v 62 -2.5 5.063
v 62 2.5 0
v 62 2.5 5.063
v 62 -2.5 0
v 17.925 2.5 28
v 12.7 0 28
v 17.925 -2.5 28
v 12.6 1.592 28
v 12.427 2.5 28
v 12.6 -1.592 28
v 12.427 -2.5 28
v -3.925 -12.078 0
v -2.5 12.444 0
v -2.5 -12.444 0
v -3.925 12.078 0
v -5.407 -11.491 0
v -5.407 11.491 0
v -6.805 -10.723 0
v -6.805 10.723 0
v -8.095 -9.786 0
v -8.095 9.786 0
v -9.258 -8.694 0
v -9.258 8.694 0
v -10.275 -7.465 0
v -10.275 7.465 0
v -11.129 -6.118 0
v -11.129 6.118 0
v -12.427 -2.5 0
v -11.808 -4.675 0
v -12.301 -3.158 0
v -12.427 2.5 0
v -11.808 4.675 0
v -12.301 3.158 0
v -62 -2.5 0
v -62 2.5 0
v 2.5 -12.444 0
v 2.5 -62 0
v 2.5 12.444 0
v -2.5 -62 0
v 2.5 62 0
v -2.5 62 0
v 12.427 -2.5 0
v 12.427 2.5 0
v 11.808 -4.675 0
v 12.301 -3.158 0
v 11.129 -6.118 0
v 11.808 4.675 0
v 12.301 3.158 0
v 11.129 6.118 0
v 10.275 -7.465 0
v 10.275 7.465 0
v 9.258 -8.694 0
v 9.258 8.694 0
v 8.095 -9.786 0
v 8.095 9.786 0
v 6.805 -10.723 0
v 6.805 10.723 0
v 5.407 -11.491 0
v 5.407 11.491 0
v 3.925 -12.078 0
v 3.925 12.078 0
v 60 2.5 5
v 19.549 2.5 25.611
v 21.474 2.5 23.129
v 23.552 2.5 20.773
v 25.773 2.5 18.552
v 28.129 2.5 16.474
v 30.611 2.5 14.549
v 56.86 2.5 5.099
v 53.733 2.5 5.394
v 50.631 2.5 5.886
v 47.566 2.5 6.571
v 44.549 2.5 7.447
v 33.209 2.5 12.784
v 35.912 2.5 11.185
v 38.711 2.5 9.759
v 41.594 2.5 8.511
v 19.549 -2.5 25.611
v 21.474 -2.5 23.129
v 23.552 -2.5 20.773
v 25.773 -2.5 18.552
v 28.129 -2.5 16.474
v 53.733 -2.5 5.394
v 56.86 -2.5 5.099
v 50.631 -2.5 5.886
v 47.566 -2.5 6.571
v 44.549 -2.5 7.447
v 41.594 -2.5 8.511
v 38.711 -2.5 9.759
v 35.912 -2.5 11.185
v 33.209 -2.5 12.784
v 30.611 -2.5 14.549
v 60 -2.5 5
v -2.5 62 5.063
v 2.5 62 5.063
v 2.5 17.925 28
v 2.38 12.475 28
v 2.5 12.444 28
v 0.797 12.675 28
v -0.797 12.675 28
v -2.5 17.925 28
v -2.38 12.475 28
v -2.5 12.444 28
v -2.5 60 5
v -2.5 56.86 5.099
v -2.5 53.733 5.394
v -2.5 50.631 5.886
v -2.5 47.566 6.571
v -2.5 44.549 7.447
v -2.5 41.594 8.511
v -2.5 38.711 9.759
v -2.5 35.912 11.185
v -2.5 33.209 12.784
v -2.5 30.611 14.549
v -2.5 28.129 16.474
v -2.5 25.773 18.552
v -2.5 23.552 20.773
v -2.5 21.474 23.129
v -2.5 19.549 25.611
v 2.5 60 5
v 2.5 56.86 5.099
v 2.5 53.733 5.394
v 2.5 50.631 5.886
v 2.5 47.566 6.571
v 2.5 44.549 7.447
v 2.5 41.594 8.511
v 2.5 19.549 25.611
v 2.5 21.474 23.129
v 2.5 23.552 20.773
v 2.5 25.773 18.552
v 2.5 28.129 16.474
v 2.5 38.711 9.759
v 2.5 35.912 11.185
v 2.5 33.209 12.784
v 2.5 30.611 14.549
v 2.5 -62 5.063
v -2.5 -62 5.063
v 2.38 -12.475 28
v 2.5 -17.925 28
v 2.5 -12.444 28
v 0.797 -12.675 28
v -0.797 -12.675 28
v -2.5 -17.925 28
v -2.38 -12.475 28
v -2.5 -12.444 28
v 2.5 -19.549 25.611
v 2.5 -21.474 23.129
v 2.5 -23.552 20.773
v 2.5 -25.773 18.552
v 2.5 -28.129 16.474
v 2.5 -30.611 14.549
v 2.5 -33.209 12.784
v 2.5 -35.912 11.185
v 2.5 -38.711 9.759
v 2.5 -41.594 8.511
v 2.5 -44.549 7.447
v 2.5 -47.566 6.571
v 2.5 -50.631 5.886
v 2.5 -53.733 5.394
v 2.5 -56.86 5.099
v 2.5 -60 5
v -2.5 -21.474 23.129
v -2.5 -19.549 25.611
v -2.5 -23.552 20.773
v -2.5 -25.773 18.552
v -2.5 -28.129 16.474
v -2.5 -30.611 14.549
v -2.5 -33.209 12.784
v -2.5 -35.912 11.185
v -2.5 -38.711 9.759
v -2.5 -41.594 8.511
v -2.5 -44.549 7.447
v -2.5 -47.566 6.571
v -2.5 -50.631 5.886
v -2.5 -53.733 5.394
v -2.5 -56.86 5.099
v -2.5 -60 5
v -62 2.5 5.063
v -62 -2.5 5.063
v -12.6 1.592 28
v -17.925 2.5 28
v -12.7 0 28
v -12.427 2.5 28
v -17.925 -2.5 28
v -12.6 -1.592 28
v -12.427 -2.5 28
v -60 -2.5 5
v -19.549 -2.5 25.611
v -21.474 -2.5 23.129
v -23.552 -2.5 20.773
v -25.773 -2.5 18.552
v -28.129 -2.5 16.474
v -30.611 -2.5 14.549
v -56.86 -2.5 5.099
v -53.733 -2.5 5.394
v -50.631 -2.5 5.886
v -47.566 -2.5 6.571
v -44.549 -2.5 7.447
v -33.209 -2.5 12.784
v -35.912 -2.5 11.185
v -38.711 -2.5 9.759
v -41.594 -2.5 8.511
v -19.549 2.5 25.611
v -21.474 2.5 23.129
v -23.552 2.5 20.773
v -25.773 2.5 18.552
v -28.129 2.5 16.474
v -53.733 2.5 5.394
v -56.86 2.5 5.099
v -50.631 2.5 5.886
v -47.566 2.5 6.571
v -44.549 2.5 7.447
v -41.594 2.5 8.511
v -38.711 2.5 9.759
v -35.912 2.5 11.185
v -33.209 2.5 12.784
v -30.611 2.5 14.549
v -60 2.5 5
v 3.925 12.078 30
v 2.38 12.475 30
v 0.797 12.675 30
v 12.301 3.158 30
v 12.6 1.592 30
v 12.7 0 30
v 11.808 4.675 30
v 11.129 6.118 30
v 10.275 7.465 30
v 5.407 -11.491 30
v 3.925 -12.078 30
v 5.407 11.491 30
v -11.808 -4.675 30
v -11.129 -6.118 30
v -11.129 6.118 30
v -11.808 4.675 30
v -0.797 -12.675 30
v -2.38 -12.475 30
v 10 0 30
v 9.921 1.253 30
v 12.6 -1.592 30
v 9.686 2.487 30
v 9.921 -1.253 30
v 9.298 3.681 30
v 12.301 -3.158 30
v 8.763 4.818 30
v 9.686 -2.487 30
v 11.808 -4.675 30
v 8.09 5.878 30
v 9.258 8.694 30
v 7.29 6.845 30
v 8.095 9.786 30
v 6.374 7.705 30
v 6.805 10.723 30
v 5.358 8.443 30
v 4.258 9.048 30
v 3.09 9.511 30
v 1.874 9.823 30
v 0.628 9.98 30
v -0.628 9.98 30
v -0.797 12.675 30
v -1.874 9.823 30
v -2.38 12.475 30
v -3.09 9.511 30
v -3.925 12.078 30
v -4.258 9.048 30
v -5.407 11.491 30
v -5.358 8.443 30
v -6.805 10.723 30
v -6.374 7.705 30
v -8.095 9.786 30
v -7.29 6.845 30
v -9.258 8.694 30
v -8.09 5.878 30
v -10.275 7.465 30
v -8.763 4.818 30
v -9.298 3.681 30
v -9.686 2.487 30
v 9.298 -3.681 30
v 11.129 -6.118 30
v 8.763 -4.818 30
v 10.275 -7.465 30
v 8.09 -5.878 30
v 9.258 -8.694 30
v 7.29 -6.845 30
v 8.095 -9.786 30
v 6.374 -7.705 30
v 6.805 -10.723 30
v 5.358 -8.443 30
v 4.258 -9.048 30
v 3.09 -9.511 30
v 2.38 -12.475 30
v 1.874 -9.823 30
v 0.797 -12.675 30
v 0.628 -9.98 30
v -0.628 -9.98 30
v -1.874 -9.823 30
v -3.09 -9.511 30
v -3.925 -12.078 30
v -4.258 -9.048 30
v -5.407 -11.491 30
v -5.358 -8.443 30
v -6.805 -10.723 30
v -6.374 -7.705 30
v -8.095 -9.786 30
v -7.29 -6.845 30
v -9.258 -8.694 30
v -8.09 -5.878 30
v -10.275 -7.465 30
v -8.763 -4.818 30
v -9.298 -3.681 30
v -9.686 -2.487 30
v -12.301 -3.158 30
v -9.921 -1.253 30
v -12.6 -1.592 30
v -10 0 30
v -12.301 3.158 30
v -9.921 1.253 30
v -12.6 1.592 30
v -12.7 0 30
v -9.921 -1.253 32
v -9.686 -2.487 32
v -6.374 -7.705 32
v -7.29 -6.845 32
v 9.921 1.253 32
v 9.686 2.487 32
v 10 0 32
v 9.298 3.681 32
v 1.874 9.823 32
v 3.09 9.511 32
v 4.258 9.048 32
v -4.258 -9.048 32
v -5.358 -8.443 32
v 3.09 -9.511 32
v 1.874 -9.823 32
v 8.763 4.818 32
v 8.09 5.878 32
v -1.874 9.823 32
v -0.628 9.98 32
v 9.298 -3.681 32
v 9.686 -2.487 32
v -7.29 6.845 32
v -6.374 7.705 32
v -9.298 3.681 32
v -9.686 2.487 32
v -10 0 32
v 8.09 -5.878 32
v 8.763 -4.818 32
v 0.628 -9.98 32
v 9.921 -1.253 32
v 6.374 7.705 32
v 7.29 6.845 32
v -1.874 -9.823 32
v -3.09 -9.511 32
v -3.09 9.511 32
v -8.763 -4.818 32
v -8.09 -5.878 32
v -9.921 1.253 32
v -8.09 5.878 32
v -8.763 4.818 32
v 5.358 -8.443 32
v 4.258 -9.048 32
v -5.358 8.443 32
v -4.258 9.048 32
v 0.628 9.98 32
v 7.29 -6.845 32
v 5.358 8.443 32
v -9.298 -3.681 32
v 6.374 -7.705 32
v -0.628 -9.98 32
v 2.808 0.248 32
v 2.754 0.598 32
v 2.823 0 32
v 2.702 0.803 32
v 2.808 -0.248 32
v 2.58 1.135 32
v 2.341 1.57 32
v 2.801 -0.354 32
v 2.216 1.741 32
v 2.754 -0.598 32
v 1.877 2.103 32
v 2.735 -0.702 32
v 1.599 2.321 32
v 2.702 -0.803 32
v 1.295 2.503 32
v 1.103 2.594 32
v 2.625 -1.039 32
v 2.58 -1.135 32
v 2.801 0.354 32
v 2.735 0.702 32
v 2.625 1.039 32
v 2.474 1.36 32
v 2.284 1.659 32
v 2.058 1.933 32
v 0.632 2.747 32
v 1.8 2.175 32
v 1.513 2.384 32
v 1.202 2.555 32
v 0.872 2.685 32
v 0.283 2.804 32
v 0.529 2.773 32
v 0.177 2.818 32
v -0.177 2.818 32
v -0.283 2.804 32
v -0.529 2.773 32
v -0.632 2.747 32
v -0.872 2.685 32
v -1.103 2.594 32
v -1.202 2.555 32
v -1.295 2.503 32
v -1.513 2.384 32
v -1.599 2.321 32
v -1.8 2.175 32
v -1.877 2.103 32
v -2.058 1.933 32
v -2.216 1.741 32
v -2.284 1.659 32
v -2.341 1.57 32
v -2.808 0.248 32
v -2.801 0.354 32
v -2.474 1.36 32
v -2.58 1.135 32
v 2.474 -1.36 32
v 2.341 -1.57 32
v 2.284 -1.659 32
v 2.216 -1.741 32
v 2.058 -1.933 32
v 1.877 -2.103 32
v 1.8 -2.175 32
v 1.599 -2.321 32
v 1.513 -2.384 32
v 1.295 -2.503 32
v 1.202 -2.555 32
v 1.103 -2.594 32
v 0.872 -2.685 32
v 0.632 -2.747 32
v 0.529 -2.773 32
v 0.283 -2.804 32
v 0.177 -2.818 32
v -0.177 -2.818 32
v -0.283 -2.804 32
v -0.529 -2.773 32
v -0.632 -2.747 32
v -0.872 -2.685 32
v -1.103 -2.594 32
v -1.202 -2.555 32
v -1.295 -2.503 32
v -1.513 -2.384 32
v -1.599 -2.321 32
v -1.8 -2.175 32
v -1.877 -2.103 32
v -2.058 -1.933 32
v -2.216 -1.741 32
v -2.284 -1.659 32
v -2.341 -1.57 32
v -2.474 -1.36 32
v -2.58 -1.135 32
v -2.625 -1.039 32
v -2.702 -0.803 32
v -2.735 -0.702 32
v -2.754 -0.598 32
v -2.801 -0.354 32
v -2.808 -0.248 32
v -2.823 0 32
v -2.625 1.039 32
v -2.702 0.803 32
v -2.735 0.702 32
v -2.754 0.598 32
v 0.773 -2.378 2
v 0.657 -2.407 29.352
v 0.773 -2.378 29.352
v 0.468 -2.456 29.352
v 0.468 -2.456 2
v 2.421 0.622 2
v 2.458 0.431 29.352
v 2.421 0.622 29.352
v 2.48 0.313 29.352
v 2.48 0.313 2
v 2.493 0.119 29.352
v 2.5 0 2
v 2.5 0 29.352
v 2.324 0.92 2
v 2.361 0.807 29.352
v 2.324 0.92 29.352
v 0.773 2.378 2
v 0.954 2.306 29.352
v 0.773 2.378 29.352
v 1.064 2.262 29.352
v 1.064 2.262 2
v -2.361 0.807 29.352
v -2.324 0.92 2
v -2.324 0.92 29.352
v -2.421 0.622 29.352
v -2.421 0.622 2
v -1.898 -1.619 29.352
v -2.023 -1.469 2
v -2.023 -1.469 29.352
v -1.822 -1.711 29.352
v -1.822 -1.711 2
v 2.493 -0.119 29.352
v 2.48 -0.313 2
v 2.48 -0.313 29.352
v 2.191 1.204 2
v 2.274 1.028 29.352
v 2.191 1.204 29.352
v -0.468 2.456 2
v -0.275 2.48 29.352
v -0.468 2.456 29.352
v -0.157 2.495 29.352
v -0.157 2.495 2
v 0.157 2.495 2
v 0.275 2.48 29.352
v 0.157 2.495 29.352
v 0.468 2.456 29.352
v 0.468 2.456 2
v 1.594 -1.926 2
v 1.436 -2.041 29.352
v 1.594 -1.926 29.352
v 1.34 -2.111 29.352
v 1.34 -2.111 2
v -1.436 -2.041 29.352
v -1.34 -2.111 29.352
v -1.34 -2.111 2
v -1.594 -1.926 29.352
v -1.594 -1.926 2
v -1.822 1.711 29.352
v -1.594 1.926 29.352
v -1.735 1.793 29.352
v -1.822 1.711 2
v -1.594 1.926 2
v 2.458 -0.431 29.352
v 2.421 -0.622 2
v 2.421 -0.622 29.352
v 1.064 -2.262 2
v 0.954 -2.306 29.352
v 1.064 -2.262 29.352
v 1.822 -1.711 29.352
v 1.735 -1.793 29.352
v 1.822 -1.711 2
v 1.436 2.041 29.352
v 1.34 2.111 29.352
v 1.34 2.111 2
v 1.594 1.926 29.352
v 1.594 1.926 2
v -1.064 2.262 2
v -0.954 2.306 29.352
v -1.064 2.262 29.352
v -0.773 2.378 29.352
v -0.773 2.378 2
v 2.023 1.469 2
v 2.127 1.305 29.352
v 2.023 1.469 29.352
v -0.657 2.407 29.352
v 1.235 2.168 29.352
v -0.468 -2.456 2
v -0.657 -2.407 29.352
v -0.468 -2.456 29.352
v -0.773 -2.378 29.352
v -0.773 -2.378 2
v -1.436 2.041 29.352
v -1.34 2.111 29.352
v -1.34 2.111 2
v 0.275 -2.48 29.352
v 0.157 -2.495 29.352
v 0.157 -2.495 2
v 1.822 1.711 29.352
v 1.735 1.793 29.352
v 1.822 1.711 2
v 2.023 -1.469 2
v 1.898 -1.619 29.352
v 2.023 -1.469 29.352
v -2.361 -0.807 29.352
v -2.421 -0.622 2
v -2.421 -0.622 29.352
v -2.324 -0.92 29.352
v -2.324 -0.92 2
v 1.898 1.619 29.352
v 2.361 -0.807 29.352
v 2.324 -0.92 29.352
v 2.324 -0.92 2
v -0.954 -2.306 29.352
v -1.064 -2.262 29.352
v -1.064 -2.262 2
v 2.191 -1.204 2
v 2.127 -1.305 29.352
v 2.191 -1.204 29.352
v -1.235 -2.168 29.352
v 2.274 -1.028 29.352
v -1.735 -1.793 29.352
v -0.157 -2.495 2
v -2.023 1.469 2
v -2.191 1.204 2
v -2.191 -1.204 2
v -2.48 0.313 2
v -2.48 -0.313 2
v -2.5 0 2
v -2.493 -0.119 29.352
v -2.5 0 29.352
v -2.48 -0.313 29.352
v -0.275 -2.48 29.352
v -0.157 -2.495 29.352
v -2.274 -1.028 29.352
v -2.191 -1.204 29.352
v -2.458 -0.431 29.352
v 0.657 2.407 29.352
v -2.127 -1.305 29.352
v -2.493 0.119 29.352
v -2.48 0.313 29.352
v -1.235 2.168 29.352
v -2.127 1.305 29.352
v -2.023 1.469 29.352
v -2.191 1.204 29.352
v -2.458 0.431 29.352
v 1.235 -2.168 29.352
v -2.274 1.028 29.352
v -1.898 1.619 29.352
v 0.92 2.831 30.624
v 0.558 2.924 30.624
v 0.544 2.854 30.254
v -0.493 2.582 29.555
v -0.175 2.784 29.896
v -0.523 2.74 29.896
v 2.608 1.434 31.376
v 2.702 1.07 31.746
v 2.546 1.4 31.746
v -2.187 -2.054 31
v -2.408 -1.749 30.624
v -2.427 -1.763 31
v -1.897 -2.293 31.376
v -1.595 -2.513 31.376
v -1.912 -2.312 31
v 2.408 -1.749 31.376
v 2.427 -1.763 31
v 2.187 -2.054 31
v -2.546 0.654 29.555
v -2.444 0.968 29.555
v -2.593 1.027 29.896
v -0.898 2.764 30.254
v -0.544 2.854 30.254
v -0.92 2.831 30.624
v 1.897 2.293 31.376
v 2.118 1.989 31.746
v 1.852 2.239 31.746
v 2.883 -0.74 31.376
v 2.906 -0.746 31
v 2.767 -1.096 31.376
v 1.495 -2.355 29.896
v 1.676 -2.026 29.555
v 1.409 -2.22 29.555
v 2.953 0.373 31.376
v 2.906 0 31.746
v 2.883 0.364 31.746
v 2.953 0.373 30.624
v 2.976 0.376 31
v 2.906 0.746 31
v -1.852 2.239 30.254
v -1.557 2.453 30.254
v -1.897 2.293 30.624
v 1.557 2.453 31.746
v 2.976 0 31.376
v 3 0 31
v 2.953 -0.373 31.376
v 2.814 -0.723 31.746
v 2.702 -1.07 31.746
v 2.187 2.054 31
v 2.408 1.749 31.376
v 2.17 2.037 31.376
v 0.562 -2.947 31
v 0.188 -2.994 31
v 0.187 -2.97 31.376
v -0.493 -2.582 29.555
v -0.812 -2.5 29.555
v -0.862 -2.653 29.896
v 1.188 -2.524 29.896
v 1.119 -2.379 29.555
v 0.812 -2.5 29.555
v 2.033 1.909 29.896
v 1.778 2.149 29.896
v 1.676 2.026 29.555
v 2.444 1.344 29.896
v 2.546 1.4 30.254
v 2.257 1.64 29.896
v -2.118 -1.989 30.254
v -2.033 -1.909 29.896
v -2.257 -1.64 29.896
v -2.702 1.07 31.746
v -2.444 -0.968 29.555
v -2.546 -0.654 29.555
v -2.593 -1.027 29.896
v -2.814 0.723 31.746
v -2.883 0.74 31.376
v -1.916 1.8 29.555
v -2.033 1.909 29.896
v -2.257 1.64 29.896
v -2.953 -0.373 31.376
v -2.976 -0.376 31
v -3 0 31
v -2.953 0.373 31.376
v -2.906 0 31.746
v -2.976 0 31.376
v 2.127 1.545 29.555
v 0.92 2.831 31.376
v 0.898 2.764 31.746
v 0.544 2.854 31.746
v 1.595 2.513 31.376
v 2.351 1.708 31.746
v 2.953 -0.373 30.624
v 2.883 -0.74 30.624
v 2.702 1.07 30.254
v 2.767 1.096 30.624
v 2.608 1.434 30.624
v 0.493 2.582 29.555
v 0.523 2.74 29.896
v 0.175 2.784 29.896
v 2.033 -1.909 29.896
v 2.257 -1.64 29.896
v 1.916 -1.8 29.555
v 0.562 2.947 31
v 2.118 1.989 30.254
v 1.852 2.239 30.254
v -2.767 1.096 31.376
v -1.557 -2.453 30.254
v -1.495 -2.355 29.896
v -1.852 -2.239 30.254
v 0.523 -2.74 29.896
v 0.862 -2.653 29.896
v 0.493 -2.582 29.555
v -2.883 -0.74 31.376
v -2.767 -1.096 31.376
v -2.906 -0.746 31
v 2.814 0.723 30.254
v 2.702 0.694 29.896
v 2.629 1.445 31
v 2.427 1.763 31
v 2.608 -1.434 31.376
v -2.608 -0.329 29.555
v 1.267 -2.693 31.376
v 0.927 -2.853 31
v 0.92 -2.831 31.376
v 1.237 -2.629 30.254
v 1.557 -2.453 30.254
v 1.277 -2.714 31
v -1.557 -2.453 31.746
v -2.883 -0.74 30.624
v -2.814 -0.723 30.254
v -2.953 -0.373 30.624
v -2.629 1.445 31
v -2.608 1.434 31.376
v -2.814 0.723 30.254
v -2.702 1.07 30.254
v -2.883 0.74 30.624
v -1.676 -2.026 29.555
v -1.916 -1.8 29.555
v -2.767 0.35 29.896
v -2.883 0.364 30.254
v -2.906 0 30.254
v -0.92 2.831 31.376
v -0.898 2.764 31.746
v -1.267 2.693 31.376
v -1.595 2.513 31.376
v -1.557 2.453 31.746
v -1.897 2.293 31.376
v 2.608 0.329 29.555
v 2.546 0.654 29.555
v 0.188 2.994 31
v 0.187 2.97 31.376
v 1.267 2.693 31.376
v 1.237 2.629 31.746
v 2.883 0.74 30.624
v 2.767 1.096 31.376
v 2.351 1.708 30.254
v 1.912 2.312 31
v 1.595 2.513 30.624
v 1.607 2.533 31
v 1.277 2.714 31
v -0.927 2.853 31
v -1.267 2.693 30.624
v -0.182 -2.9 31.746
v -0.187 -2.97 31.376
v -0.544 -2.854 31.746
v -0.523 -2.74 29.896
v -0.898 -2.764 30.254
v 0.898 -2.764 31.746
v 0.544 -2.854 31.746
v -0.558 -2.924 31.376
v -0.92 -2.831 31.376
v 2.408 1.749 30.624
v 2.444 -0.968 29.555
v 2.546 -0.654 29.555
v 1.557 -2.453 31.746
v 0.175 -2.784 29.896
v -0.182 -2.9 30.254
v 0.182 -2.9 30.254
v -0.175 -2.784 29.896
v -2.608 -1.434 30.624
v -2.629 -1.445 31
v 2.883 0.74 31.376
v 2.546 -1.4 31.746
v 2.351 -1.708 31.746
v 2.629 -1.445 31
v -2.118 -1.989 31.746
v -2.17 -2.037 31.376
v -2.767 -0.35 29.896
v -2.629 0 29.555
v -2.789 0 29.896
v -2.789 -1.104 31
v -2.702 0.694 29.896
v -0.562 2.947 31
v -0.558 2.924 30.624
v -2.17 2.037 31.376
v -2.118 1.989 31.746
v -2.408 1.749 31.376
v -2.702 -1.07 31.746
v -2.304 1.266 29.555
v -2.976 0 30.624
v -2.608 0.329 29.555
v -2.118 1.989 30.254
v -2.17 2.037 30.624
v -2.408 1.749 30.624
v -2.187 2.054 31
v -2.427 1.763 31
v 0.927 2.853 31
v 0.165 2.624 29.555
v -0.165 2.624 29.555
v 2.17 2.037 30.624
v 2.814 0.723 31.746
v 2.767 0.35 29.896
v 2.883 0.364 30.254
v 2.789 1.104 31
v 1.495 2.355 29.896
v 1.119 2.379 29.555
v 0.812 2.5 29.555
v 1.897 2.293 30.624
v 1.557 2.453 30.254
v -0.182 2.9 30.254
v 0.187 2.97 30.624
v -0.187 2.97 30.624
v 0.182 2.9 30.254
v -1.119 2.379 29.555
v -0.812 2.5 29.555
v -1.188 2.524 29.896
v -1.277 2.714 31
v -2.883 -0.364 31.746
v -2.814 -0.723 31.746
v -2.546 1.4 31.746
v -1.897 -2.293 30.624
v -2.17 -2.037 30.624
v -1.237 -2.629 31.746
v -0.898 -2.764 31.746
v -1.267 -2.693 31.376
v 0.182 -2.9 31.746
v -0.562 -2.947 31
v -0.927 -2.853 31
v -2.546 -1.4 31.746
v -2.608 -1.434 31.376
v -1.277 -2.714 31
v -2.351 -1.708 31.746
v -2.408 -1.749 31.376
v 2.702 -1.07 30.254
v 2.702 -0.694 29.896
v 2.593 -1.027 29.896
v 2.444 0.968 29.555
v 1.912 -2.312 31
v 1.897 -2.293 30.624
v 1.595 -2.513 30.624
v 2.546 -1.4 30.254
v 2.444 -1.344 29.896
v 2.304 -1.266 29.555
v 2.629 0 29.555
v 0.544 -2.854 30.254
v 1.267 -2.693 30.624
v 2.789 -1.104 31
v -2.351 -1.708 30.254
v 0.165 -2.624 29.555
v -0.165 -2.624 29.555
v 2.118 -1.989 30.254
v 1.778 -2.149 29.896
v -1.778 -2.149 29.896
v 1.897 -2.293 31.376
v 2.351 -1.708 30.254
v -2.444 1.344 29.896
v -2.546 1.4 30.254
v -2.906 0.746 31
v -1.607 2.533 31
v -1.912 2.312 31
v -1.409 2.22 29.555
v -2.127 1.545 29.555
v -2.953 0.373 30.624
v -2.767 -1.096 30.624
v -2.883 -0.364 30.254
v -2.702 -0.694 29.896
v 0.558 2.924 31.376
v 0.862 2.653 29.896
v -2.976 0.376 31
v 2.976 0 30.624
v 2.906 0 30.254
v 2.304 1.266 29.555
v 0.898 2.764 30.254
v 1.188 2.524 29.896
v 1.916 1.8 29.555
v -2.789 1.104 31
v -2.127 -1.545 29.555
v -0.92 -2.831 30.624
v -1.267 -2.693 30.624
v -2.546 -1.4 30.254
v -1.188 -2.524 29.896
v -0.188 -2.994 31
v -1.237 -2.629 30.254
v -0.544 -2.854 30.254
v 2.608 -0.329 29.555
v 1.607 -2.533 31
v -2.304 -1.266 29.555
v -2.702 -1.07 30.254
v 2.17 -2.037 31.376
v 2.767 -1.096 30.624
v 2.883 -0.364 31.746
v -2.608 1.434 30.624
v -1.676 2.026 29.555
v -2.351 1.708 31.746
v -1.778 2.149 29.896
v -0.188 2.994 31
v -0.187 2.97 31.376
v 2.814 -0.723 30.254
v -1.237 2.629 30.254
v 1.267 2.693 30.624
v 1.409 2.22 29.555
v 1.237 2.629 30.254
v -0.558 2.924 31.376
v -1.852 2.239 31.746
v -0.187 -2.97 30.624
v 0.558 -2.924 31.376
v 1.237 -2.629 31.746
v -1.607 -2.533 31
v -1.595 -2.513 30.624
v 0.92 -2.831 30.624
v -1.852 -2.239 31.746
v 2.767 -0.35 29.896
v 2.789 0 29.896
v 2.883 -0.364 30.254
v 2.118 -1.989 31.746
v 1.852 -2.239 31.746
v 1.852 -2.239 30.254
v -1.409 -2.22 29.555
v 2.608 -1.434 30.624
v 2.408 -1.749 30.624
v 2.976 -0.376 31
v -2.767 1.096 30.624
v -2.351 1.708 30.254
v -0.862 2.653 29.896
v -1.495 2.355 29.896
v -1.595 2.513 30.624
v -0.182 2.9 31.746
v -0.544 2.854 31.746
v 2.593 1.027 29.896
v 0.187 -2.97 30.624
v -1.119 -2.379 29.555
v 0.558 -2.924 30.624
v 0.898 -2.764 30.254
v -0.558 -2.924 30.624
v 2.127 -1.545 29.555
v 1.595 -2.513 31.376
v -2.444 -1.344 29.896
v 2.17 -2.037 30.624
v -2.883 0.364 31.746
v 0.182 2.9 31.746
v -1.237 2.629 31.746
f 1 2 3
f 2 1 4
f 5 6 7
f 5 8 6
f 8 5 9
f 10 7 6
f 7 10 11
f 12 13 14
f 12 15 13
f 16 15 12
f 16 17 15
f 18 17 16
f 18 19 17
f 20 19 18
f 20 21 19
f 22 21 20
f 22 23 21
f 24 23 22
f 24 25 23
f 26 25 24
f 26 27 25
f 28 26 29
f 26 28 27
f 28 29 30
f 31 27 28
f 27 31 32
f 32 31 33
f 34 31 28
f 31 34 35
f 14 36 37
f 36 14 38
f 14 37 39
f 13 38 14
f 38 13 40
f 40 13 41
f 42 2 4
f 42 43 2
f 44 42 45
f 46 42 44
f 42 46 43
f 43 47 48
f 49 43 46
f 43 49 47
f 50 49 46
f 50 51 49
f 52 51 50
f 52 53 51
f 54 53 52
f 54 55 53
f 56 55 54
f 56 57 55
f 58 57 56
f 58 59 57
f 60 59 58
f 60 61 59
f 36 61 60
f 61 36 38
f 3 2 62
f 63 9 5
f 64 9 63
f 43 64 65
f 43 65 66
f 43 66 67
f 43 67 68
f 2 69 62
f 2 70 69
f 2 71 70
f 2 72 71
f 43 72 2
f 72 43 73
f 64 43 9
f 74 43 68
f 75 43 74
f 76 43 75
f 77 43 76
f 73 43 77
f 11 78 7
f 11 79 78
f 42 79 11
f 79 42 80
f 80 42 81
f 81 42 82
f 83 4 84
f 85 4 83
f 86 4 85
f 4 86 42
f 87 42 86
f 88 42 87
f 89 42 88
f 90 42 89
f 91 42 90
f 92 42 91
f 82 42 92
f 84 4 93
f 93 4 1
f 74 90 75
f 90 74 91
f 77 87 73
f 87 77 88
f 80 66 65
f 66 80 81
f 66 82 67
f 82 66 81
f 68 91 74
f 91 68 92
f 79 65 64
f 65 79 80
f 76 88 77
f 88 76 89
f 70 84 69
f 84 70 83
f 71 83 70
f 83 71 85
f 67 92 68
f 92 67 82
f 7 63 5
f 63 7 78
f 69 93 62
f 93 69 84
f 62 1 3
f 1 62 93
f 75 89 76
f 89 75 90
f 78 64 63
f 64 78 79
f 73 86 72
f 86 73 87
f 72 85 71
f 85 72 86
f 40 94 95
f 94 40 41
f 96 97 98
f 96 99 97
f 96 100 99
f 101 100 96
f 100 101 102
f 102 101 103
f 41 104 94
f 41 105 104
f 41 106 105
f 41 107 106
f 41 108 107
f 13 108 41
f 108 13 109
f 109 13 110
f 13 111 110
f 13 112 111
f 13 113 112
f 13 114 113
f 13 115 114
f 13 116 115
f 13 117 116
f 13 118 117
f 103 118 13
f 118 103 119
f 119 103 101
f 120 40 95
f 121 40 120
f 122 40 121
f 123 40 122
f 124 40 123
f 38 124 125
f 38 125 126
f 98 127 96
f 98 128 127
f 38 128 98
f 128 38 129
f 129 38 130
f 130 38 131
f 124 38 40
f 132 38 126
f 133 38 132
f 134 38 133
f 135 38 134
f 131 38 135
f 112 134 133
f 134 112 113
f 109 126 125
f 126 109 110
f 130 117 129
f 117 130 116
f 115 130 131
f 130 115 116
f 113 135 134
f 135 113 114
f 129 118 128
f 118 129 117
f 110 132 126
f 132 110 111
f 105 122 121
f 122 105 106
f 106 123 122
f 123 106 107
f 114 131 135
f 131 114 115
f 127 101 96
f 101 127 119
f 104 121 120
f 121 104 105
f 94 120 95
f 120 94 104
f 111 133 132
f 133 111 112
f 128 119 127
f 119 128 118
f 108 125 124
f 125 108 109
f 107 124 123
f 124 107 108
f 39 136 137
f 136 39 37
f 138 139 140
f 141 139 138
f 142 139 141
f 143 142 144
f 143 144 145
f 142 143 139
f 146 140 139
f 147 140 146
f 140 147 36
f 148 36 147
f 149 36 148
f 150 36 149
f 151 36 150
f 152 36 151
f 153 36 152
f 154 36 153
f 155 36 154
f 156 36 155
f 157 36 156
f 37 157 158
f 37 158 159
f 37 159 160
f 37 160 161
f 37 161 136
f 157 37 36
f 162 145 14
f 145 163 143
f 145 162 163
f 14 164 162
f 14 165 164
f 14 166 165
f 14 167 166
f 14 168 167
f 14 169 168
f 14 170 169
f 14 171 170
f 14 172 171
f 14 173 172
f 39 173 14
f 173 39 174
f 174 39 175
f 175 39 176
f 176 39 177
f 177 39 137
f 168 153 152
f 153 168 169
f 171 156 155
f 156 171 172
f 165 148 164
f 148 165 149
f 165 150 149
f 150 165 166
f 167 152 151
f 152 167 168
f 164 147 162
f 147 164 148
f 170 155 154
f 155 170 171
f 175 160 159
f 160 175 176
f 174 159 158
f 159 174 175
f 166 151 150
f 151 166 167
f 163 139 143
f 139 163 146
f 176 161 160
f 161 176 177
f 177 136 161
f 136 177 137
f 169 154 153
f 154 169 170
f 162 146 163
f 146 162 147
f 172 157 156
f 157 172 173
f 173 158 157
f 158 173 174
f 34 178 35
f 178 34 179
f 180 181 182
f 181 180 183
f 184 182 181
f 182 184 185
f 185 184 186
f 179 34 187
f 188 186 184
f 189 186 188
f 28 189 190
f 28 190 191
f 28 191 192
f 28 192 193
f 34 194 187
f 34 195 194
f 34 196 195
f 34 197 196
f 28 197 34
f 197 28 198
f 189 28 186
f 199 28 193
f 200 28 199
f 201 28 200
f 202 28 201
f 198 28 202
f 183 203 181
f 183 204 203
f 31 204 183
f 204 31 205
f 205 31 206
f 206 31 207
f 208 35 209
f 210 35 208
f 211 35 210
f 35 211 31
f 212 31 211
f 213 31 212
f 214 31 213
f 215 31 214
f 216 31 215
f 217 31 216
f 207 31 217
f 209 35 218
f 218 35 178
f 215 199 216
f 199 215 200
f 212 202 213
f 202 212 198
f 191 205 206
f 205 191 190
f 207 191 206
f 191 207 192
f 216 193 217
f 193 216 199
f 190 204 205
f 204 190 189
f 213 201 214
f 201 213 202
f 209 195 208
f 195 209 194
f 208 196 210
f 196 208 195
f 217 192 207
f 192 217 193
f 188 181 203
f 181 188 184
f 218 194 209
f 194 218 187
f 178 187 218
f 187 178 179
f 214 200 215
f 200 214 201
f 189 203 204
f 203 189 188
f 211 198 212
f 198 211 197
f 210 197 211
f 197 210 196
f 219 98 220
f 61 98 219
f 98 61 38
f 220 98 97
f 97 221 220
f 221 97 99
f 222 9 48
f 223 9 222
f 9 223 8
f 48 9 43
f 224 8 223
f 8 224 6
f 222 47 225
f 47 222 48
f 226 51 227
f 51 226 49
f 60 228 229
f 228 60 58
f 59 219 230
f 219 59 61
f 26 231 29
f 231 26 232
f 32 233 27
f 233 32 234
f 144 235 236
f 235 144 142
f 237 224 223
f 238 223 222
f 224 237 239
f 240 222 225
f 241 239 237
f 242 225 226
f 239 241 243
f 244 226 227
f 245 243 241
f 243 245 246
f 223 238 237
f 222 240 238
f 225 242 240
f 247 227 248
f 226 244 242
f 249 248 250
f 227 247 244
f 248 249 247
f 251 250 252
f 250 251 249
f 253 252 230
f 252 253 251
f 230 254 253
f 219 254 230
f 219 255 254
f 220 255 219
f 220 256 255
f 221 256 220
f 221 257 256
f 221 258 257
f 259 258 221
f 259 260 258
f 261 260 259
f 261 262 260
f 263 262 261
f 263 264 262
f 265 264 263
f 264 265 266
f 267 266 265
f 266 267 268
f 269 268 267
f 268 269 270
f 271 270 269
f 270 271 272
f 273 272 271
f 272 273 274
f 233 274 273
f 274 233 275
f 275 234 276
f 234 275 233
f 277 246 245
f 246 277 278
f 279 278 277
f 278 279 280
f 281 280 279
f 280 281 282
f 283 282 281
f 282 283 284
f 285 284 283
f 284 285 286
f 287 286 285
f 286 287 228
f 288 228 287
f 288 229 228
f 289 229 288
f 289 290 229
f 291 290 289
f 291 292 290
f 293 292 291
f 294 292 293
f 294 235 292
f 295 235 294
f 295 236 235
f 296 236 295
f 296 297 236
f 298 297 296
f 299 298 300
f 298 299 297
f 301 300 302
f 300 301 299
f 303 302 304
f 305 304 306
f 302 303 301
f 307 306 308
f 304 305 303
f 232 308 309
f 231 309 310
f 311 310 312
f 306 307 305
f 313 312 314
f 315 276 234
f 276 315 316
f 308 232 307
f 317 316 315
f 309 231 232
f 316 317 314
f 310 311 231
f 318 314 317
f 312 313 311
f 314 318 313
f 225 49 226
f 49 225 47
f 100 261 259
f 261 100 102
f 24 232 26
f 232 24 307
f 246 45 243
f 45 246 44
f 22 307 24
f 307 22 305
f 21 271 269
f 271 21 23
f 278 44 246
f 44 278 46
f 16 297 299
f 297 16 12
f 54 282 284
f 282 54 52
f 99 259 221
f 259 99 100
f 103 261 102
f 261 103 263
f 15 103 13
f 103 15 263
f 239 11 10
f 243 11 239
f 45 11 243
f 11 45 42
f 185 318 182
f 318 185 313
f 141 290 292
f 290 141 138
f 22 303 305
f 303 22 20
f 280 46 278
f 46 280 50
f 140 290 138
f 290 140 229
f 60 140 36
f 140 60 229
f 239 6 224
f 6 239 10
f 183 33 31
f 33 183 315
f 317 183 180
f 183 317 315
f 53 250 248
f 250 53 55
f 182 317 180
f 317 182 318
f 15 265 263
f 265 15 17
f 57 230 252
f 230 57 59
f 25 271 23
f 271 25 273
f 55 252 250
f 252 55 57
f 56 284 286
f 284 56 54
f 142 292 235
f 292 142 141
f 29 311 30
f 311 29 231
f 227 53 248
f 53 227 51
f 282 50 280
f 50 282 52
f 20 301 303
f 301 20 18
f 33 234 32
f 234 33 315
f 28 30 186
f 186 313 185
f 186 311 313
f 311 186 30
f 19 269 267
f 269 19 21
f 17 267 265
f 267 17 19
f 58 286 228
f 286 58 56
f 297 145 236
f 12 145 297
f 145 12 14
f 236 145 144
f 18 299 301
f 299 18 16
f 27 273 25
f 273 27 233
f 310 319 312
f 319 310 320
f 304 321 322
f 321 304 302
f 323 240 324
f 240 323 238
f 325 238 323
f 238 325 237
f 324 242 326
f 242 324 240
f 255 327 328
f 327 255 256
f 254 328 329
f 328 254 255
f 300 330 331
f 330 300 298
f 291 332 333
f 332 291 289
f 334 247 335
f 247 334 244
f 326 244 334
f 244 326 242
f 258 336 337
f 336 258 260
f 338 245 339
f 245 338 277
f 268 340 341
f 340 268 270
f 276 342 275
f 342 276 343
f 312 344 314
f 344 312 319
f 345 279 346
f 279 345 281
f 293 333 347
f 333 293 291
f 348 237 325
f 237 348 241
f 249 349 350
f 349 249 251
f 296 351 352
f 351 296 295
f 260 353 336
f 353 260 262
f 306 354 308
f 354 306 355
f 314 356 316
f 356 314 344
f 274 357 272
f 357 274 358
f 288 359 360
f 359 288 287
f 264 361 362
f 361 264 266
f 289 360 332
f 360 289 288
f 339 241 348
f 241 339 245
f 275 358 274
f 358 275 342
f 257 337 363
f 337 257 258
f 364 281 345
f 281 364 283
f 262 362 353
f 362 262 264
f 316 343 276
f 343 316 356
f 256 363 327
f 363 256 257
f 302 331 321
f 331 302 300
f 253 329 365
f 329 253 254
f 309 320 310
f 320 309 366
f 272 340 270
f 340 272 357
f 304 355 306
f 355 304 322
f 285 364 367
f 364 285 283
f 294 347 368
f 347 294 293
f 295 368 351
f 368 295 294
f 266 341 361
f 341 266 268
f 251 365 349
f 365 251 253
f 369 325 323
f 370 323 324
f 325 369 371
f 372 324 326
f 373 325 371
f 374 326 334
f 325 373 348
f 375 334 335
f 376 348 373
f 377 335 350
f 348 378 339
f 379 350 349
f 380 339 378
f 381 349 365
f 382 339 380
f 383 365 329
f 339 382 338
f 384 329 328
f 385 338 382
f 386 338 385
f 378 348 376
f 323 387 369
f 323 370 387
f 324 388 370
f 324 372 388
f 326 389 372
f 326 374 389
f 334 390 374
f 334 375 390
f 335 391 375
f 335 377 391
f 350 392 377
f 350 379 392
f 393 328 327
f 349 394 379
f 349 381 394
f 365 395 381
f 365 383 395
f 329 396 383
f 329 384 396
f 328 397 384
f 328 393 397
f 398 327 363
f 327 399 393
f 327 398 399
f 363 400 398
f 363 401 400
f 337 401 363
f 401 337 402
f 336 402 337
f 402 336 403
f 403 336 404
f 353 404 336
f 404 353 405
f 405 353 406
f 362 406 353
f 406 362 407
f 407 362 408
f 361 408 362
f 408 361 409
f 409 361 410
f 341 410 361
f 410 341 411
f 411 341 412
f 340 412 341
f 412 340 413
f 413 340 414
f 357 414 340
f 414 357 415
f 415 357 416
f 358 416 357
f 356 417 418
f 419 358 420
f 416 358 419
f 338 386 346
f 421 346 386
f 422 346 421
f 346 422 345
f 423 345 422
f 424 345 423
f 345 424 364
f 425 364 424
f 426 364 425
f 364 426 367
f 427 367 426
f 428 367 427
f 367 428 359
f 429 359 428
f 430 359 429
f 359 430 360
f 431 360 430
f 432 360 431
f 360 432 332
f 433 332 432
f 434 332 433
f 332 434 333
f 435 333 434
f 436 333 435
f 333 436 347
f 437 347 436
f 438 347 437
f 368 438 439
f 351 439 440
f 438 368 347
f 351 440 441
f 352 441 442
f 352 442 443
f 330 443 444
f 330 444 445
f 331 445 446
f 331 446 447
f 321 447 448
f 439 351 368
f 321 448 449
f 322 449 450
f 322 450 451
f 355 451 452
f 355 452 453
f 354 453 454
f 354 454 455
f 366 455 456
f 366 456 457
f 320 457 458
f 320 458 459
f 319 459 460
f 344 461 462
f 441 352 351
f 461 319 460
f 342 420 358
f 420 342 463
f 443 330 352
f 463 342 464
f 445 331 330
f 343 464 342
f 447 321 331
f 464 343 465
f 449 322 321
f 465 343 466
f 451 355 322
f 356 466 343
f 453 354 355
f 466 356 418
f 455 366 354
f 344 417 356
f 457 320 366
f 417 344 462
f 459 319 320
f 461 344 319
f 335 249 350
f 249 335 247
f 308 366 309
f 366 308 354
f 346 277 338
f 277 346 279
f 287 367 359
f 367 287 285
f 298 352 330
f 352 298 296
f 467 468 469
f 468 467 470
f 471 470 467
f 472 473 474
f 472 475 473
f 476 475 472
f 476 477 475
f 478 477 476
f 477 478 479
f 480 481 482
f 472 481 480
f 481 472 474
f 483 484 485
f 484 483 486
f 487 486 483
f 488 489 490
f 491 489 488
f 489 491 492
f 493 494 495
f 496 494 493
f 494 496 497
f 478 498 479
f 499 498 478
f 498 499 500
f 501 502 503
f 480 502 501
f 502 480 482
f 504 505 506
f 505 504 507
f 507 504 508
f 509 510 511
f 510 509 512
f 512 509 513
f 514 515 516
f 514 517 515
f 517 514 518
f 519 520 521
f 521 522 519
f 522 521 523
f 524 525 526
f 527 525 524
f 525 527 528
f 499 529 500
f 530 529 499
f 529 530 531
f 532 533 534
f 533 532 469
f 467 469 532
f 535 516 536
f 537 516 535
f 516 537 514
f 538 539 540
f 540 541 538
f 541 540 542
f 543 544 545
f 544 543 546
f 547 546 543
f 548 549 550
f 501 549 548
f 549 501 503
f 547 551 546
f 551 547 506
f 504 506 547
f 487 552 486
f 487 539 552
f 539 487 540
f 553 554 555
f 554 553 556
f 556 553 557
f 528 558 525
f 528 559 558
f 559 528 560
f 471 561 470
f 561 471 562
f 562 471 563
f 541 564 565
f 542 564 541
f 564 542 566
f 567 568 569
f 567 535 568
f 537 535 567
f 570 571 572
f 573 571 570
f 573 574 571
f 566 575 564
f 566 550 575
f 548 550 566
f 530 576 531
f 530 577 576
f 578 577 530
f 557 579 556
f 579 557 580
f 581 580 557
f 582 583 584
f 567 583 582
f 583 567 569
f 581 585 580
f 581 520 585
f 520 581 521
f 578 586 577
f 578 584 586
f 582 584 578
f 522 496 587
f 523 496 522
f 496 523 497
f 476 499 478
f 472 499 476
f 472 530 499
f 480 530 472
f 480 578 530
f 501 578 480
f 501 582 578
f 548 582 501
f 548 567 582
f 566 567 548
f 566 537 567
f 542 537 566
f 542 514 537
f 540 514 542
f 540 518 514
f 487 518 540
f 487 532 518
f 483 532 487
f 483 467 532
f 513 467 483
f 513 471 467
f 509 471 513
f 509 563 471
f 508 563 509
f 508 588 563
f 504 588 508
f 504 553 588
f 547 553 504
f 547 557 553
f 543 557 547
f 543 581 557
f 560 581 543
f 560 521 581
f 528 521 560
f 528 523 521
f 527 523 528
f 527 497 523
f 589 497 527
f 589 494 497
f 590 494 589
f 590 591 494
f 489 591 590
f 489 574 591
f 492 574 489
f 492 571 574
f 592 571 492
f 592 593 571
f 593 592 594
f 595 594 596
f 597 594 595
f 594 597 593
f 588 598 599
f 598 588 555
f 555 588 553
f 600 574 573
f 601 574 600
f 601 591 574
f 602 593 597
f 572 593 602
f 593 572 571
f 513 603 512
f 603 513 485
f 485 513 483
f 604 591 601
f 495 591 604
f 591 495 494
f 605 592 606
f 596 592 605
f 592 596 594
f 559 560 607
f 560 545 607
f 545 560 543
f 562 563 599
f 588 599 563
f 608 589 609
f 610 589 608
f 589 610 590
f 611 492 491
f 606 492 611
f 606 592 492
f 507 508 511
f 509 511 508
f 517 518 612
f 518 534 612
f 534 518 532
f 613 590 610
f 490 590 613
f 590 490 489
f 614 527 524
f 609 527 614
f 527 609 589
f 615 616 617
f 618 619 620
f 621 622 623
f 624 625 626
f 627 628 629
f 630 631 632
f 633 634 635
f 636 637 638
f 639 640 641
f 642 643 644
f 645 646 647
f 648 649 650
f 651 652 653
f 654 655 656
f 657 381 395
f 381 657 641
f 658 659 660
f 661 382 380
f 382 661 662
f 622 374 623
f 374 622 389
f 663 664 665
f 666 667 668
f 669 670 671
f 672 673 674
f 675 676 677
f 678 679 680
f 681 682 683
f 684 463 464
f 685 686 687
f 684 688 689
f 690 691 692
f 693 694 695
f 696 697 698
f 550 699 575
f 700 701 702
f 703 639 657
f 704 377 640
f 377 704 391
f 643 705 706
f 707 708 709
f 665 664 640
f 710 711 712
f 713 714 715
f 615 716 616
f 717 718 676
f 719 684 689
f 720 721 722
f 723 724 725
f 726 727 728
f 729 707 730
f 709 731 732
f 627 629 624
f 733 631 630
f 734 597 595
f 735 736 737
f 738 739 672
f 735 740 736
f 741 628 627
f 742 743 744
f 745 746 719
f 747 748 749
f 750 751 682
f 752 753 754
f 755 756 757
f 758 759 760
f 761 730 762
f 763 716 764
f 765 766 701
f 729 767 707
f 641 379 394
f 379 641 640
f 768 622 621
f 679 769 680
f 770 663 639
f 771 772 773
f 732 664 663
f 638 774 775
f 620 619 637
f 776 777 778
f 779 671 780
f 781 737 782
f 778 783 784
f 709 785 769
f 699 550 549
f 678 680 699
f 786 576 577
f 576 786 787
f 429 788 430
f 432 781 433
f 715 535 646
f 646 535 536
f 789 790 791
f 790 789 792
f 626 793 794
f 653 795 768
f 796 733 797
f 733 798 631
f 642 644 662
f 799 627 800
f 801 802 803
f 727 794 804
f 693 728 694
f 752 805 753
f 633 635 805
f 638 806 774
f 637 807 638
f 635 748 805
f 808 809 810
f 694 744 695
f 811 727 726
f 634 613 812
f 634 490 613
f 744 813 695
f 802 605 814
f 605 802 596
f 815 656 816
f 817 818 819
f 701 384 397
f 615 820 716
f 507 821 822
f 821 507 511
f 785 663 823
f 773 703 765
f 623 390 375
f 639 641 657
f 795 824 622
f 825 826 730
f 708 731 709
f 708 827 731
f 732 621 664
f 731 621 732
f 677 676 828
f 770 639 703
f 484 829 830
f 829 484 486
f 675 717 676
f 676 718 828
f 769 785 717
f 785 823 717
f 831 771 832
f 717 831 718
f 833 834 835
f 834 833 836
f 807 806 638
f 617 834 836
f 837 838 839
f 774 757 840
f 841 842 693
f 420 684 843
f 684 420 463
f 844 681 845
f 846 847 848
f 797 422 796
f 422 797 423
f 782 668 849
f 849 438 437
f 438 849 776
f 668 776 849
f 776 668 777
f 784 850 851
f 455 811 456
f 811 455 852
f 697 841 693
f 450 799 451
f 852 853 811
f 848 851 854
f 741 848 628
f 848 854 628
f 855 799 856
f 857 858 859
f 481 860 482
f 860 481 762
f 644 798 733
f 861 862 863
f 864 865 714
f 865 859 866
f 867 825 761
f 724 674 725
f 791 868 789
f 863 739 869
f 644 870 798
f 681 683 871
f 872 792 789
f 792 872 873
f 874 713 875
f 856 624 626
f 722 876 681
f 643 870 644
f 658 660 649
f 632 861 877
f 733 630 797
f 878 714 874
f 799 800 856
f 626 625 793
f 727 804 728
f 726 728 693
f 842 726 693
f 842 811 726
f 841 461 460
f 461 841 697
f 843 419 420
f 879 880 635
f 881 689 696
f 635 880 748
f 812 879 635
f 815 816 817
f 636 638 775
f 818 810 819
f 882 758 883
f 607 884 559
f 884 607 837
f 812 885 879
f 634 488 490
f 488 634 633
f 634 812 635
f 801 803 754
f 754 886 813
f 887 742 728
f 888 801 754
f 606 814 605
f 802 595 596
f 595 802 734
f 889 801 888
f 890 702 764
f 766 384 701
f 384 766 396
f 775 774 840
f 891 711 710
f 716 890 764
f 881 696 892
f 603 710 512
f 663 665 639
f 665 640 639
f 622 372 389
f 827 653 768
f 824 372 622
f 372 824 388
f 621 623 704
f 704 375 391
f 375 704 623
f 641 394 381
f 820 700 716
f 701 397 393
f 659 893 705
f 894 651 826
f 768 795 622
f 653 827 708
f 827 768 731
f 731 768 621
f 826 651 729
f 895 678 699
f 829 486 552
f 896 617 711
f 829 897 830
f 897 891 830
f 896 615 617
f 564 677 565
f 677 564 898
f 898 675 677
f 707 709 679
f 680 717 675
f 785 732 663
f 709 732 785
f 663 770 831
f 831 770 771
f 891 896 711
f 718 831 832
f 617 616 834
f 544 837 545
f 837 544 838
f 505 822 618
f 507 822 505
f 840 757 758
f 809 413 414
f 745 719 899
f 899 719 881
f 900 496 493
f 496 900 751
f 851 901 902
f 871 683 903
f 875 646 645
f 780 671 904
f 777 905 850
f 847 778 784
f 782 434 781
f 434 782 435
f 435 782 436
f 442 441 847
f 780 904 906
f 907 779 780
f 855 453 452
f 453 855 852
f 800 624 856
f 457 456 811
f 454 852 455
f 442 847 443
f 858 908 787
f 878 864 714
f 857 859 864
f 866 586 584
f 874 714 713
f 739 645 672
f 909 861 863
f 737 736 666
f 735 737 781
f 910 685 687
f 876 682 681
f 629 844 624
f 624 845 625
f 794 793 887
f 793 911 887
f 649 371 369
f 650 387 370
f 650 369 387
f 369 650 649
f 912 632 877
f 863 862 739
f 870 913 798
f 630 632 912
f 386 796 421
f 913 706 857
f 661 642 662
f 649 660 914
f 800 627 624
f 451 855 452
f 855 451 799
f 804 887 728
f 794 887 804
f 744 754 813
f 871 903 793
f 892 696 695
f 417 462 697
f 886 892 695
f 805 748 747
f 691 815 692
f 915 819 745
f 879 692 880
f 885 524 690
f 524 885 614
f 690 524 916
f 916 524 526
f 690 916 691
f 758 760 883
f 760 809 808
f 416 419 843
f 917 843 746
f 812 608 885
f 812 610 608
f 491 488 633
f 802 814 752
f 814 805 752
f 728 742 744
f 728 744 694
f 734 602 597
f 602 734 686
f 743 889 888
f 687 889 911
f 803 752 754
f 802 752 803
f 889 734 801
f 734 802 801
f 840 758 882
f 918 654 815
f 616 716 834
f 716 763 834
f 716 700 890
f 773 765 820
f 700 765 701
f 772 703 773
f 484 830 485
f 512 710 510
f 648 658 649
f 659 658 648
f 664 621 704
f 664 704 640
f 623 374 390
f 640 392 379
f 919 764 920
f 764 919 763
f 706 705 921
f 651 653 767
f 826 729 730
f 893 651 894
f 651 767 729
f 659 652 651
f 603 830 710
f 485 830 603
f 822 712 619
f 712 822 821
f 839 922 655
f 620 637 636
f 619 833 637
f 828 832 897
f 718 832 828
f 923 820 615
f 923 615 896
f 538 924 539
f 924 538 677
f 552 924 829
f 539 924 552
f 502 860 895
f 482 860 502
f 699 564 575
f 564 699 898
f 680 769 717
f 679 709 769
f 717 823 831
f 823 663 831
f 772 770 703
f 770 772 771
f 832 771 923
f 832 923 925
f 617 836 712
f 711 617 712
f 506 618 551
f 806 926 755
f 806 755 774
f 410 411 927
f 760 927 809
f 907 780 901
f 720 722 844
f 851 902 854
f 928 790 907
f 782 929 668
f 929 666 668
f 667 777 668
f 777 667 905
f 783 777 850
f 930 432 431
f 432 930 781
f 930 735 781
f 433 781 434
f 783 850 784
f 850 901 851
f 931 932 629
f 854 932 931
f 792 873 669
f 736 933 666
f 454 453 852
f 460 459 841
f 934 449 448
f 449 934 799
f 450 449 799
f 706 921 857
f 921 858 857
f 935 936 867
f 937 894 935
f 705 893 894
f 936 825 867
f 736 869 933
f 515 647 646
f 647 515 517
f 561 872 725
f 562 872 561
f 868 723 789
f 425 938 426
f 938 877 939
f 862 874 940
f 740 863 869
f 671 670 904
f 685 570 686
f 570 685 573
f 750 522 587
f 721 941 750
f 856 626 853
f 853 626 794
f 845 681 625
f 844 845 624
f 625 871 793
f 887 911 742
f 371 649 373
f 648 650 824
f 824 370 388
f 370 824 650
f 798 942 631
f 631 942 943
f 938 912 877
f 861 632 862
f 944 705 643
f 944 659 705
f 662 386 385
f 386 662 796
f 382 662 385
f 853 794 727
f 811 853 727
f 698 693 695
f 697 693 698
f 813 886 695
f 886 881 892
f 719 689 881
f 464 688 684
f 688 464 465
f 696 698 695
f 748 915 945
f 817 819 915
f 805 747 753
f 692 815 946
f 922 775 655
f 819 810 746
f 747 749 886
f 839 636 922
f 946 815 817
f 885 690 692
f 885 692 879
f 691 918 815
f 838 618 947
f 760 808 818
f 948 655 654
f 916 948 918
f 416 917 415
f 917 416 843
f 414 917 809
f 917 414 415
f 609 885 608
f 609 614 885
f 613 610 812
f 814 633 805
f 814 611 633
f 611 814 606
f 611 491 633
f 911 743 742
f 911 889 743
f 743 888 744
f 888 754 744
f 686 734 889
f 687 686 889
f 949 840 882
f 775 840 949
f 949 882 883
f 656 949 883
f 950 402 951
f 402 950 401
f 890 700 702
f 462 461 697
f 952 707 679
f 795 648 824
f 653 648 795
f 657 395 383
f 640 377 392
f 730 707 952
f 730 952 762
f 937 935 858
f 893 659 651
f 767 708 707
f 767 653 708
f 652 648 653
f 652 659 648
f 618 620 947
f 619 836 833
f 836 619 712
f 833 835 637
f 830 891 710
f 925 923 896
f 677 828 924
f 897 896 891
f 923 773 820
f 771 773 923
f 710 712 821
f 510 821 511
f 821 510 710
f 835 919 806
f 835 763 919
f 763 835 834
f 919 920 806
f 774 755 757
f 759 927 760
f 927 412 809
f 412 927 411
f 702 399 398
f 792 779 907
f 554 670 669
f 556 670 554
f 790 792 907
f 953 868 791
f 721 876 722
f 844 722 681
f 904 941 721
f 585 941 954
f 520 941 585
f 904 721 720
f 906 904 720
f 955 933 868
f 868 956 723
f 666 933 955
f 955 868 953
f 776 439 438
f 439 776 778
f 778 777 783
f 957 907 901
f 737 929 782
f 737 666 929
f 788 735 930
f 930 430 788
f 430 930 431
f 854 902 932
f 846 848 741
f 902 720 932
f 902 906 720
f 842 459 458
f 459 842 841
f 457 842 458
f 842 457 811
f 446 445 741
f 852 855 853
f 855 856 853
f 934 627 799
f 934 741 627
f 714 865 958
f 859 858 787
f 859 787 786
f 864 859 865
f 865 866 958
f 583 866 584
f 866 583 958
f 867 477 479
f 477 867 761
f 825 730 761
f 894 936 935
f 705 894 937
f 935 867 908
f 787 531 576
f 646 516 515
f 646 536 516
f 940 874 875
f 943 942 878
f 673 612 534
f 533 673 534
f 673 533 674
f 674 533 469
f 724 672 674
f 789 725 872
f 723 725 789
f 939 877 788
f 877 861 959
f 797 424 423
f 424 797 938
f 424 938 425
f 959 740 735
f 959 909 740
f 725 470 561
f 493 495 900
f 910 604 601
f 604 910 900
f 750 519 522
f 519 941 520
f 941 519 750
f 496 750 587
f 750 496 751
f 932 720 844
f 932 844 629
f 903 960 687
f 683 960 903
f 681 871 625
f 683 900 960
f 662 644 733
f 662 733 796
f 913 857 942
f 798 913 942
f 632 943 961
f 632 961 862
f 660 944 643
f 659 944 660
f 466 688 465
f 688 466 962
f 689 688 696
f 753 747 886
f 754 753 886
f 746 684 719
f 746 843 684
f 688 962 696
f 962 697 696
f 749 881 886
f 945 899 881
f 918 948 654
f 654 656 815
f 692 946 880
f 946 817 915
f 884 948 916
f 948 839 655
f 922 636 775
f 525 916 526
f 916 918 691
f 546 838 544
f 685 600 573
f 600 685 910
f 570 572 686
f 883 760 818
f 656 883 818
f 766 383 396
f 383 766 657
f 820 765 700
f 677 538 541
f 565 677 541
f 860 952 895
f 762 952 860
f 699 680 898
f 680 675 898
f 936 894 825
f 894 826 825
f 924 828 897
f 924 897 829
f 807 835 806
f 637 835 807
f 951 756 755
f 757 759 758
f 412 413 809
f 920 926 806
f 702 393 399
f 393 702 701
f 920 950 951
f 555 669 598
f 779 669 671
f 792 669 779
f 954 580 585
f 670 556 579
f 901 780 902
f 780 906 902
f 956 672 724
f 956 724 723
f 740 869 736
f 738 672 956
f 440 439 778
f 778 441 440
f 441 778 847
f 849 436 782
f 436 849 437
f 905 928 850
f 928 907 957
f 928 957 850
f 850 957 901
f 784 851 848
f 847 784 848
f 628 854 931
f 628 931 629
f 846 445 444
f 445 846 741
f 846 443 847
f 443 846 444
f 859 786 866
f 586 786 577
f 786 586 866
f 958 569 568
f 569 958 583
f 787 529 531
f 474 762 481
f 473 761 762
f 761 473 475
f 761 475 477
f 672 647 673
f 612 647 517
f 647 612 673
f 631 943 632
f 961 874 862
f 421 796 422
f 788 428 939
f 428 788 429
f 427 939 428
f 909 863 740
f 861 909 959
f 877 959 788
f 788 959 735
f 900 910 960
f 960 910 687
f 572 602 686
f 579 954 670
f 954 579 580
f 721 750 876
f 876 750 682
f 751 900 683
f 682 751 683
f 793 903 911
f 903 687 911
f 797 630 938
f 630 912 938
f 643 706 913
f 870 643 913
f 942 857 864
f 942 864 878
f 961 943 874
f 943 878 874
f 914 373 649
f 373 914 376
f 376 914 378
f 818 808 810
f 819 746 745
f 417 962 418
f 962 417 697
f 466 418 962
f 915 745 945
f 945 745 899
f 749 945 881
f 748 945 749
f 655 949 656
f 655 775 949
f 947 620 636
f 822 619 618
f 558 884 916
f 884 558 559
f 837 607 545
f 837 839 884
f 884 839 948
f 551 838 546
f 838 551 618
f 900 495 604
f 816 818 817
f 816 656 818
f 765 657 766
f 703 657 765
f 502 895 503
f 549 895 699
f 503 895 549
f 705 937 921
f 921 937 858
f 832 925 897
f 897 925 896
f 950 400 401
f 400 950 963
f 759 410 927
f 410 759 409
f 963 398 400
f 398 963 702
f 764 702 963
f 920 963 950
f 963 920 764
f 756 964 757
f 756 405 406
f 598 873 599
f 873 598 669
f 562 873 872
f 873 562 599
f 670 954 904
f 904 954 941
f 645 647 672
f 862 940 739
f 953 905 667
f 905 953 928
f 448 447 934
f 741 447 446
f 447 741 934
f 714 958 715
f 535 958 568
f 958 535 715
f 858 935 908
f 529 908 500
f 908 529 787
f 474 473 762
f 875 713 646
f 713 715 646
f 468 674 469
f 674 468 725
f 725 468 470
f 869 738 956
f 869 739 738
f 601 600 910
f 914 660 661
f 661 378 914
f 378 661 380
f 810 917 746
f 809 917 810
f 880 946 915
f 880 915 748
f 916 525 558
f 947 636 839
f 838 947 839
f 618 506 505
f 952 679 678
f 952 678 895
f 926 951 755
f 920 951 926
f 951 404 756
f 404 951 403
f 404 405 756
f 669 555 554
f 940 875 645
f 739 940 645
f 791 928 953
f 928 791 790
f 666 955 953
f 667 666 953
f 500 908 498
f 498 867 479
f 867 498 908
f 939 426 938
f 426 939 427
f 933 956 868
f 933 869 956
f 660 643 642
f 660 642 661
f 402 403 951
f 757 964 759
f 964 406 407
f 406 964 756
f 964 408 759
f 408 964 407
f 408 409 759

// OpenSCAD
/* Global */

INNER_DIAMETER = 5;

stand();
module stand()
{
   union()
   {
       wings();
       core();
   }     
}
module core()
{
 difference()
 {   
  difference()
  {
   union()
   {   
   translate([0,0,15])   
    cylinder(d=25.4, h=30, center=true, $fn=50);
   translate([0,0,16])   
    cylinder(d=20, h=32, center=true, $fn=50);
   }
   translate([0,0,18])
      cylinder(d=INNER_DIAMETER, h=32, center=true, $fn=50);
  }    
   translate([0,0,31])
   sphere(d=INNER_DIAMETER+1, center=true, $fn=50);  
}
}

module wing()
{
  difference()
  {
   translate([12, -2.5,0])
    cube([50,5,28]); 
   translate([60,0,55])   
   rotate([90,0,0])  
      cylinder(r=50, h=100, center=true, $fn=100);
     
  } 
}

module wings()
{
    union()
    {
        wing();
        rotate([0,0,90]) wing();
        rotate([0,0,-90]) wing();
        rotate([0,0,180]) wing();
    }
}
